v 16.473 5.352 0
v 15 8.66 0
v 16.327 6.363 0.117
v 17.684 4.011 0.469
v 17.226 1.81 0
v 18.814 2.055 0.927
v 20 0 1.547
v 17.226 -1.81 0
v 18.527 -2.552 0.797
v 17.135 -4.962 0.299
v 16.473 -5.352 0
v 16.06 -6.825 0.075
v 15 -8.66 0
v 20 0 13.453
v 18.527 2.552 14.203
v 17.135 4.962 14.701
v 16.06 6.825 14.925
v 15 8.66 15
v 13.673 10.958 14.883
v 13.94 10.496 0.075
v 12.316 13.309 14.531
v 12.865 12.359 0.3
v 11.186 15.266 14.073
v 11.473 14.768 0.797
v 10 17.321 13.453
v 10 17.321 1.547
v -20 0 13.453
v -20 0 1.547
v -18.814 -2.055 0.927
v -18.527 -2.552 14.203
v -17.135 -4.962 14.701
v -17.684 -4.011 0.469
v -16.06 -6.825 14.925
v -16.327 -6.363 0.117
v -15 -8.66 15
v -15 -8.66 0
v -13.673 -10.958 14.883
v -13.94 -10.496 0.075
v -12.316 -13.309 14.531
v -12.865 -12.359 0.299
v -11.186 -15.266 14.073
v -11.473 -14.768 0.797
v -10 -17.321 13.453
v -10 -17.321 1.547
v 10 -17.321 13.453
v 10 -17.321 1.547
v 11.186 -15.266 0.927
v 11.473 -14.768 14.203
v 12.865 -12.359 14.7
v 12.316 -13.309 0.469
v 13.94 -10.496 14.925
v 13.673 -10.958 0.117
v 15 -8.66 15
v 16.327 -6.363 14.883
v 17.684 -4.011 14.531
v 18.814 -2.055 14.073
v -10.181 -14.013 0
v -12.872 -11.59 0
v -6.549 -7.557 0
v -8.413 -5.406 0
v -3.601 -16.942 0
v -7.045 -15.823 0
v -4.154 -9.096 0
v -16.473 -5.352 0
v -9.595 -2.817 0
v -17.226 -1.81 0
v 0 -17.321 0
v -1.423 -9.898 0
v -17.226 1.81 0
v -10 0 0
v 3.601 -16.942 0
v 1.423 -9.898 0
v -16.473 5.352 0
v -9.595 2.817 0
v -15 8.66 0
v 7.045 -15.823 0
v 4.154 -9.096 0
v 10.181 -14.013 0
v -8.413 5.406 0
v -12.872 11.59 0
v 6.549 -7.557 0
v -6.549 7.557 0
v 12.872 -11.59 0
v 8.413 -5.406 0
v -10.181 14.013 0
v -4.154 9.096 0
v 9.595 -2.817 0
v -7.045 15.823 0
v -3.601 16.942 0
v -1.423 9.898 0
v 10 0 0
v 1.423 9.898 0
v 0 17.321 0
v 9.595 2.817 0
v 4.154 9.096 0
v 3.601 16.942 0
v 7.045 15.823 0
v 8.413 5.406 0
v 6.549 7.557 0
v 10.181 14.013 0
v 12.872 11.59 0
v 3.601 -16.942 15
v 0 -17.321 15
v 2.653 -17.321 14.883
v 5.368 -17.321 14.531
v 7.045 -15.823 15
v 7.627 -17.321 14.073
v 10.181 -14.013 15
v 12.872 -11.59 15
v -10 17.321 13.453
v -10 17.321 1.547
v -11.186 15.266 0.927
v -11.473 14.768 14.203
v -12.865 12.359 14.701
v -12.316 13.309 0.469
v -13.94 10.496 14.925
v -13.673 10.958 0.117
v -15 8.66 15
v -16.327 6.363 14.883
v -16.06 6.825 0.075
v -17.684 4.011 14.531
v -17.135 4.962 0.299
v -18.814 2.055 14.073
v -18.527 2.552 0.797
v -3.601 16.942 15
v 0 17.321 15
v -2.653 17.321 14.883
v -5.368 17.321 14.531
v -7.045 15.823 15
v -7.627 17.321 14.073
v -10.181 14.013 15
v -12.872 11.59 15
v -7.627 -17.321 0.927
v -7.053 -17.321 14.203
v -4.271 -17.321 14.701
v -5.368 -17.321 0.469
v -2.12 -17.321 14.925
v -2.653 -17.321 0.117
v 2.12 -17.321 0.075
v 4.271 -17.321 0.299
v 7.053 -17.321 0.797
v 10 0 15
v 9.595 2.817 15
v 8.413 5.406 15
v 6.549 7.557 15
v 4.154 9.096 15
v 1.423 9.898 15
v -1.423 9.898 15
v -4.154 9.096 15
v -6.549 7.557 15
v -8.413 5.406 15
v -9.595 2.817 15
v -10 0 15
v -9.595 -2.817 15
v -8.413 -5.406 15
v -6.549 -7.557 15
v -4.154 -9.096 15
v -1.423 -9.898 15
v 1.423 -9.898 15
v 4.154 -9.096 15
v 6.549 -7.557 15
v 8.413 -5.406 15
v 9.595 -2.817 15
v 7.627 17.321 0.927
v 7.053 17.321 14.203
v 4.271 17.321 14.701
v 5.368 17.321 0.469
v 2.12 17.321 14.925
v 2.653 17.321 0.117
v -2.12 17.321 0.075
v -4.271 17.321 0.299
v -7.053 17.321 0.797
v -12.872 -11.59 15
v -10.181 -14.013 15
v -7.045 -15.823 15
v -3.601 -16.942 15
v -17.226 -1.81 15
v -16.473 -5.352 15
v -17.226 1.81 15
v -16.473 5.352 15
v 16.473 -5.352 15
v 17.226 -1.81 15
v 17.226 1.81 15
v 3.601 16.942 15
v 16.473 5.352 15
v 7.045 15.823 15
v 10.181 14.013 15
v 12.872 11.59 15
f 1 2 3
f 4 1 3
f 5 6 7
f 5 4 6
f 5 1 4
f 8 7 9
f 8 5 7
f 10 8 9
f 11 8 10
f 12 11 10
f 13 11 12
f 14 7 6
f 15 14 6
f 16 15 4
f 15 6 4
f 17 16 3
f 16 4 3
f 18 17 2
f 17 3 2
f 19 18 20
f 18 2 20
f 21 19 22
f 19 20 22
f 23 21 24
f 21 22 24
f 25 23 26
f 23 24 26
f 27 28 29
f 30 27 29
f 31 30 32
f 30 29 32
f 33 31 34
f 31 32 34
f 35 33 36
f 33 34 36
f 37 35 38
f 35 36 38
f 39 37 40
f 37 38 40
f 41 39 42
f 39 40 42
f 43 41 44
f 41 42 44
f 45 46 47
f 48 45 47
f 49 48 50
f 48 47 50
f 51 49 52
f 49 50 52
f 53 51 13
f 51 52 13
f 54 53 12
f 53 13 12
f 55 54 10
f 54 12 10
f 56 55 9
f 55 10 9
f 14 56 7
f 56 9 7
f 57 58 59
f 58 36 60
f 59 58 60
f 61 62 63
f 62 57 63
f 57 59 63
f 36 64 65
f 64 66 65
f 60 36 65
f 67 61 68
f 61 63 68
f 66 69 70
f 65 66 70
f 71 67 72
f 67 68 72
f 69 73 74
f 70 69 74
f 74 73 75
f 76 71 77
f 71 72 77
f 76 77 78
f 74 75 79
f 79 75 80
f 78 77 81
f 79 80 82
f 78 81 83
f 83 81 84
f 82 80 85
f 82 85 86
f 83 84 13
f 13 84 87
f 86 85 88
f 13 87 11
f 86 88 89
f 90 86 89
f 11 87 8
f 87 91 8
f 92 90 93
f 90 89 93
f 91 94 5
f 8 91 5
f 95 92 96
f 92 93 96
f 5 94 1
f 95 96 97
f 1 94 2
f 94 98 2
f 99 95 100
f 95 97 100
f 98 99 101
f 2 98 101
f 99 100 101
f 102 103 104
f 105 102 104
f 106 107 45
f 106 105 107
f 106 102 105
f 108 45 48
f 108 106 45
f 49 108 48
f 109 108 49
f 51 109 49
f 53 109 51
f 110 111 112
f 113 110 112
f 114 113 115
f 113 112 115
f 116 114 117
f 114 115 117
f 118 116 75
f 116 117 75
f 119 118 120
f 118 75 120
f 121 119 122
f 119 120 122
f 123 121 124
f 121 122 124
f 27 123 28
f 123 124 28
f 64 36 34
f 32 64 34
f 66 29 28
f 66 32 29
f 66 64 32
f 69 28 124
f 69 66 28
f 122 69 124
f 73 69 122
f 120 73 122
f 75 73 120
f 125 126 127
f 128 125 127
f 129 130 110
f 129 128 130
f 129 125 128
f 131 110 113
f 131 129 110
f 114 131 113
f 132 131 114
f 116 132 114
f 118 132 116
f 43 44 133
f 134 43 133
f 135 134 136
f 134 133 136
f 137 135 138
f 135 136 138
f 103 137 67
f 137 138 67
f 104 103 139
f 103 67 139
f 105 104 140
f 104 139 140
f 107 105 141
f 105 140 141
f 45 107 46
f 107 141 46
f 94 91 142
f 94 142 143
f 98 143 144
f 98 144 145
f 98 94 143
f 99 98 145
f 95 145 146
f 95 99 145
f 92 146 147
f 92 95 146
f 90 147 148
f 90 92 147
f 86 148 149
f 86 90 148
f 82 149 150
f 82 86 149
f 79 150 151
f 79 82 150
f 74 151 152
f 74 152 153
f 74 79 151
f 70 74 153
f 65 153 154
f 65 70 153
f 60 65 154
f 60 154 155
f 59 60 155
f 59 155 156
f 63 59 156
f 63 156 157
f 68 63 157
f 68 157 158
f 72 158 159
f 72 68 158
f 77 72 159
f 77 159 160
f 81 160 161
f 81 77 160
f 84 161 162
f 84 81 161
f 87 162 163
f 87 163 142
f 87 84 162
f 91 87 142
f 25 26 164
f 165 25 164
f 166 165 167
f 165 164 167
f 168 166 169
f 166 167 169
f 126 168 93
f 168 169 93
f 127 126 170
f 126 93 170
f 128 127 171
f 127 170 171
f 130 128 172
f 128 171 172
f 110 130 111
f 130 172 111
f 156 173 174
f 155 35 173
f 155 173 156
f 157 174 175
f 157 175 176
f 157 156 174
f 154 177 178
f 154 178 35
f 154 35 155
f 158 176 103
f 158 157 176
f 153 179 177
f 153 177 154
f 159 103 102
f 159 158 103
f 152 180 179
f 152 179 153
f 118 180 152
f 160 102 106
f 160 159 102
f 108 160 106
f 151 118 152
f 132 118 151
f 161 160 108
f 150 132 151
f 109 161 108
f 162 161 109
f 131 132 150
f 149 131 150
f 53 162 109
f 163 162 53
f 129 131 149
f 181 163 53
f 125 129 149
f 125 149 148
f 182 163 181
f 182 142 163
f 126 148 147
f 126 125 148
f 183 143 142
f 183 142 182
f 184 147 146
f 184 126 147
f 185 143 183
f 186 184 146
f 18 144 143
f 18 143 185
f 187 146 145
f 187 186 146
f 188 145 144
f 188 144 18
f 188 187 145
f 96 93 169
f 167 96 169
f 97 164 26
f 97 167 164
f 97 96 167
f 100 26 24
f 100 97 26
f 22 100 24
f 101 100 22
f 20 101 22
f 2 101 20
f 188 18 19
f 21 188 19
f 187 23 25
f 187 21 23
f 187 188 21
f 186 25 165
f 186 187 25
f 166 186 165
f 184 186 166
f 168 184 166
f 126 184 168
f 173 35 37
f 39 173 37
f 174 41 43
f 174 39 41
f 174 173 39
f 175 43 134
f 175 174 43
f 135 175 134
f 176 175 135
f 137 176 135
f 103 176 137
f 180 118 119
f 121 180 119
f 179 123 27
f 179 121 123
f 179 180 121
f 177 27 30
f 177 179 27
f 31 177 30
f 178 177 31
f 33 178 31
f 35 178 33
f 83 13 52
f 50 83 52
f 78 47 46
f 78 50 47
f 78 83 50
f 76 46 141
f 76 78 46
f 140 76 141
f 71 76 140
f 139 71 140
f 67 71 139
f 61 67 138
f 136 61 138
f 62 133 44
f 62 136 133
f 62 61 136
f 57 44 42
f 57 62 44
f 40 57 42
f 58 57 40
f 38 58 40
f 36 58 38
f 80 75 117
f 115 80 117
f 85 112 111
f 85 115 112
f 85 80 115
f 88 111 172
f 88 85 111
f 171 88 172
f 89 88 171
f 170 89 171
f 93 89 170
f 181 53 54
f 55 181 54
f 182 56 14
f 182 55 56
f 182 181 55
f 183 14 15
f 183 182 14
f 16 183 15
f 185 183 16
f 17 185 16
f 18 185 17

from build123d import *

# Parameters (mm, degrees)
SKETCH2_R               = 10
BOSS_EXTRUDE1_DEPTH     = 15
SKETCH3_OUTSIDE_W       = 104.962
SKETCH3_OUTSIDE_H       = 99.604
SKETCH3_OUTSIDE_R       = 17.320508076
CUT_EXTRUDE1_DEPTH      = 15
CUT_EXTRUDE1_DRAFT      = -60
MIRROR1_COPY_1_SKETCH_W = 104.962
MIRROR1_COPY_1_SKETCH_H = 99.604
MIRROR1_COPY_1_SKETCH_R = 17.320508076
MIRROR1_COPY_1_DEPTH    = 15
MIRROR1_COPY_1_DRAFT    = -60


with BuildPart() as part:
    # Sketch2 → Boss-Extrude1 (new body)
    with BuildSketch(Plane.XY):
        Polygon((20, 0), (10, 17.320508076), (-10, 17.320508076), (-20, 0), (-10, -17.320508076), (10, -17.320508076), align=None)
        Circle(SKETCH2_R, mode=Mode.SUBTRACT)
    extrude(amount=BOSS_EXTRUDE1_DEPTH)


with BuildPart() as cut_extrude1_tool:
    # Sketch3 outside → Cut-Extrude1 (with draft: the straight prism first)
    with BuildSketch(Plane(origin=(0, 0, 0), x_dir=(-1, 0, 0), z_dir=(0, 0, -1))):
        Rectangle(SKETCH3_OUTSIDE_W, SKETCH3_OUTSIDE_H)
        Circle(SKETCH3_OUTSIDE_R, mode=Mode.SUBTRACT)
    extrude(amount=-CUT_EXTRUDE1_DEPTH)
    # Cut-Extrude1: the draft: its side faces are tilted about the plane it starts from
    cut_extrude1_sides = [cut_extrude1_tool.faces().sort_by_distance(p)[0] for p in [
        (0, -49.802, 7.5),
        (-52.481, 0, 7.5),
        (0, 49.802, 7.5),
        (52.481, 0, 7.5),
        (17.320508076, 0, 7.5),
    ]]
    draft(cut_extrude1_sides, Plane(origin=(0, 0, 0), x_dir=(-1, 0, 0), z_dir=(0, 0, -1)), CUT_EXTRUDE1_DRAFT)


with BuildPart() as part_1:
    add(part.part)

    # Cut-Extrude1: cut by cut_extrude1_tool
    add(cut_extrude1_tool.part, mode=Mode.SUBTRACT)


with BuildPart() as mirror1_copy_1_tool:
    # Mirror1 copy 1 sketch → Mirror1 copy 1 (with draft: the straight prism first)
    with BuildSketch(Plane(origin=(0, 0, 15), x_dir=(-1, 0, 0), z_dir=(0, 0, 1))):
        Rectangle(MIRROR1_COPY_1_SKETCH_W, MIRROR1_COPY_1_SKETCH_H)
        Circle(MIRROR1_COPY_1_SKETCH_R, mode=Mode.SUBTRACT)
    extrude(amount=-MIRROR1_COPY_1_DEPTH)
    # Mirror1 copy 1: the draft: its side faces are tilted about the plane it starts from
    mirror1_copy_1_sides = [mirror1_copy_1_tool.faces().sort_by_distance(p)[0] for p in [
        (0, -49.802, 7.5),
        (-52.481, 0, 7.5),
        (0, 49.802, 7.5),
        (52.481, 0, 7.5),
        (17.320508076, 0, 7.5),
    ]]
    draft(mirror1_copy_1_sides, Plane(origin=(0, 0, 15), x_dir=(-1, 0, 0), z_dir=(0, 0, 1)), MIRROR1_COPY_1_DRAFT)


with BuildPart() as part_2:
    add(part_1.part)

    # Mirror1 copy 1: cut by mirror1_copy_1_tool
    add(mirror1_copy_1_tool.part, mode=Mode.SUBTRACT)


solid = part_2.part
